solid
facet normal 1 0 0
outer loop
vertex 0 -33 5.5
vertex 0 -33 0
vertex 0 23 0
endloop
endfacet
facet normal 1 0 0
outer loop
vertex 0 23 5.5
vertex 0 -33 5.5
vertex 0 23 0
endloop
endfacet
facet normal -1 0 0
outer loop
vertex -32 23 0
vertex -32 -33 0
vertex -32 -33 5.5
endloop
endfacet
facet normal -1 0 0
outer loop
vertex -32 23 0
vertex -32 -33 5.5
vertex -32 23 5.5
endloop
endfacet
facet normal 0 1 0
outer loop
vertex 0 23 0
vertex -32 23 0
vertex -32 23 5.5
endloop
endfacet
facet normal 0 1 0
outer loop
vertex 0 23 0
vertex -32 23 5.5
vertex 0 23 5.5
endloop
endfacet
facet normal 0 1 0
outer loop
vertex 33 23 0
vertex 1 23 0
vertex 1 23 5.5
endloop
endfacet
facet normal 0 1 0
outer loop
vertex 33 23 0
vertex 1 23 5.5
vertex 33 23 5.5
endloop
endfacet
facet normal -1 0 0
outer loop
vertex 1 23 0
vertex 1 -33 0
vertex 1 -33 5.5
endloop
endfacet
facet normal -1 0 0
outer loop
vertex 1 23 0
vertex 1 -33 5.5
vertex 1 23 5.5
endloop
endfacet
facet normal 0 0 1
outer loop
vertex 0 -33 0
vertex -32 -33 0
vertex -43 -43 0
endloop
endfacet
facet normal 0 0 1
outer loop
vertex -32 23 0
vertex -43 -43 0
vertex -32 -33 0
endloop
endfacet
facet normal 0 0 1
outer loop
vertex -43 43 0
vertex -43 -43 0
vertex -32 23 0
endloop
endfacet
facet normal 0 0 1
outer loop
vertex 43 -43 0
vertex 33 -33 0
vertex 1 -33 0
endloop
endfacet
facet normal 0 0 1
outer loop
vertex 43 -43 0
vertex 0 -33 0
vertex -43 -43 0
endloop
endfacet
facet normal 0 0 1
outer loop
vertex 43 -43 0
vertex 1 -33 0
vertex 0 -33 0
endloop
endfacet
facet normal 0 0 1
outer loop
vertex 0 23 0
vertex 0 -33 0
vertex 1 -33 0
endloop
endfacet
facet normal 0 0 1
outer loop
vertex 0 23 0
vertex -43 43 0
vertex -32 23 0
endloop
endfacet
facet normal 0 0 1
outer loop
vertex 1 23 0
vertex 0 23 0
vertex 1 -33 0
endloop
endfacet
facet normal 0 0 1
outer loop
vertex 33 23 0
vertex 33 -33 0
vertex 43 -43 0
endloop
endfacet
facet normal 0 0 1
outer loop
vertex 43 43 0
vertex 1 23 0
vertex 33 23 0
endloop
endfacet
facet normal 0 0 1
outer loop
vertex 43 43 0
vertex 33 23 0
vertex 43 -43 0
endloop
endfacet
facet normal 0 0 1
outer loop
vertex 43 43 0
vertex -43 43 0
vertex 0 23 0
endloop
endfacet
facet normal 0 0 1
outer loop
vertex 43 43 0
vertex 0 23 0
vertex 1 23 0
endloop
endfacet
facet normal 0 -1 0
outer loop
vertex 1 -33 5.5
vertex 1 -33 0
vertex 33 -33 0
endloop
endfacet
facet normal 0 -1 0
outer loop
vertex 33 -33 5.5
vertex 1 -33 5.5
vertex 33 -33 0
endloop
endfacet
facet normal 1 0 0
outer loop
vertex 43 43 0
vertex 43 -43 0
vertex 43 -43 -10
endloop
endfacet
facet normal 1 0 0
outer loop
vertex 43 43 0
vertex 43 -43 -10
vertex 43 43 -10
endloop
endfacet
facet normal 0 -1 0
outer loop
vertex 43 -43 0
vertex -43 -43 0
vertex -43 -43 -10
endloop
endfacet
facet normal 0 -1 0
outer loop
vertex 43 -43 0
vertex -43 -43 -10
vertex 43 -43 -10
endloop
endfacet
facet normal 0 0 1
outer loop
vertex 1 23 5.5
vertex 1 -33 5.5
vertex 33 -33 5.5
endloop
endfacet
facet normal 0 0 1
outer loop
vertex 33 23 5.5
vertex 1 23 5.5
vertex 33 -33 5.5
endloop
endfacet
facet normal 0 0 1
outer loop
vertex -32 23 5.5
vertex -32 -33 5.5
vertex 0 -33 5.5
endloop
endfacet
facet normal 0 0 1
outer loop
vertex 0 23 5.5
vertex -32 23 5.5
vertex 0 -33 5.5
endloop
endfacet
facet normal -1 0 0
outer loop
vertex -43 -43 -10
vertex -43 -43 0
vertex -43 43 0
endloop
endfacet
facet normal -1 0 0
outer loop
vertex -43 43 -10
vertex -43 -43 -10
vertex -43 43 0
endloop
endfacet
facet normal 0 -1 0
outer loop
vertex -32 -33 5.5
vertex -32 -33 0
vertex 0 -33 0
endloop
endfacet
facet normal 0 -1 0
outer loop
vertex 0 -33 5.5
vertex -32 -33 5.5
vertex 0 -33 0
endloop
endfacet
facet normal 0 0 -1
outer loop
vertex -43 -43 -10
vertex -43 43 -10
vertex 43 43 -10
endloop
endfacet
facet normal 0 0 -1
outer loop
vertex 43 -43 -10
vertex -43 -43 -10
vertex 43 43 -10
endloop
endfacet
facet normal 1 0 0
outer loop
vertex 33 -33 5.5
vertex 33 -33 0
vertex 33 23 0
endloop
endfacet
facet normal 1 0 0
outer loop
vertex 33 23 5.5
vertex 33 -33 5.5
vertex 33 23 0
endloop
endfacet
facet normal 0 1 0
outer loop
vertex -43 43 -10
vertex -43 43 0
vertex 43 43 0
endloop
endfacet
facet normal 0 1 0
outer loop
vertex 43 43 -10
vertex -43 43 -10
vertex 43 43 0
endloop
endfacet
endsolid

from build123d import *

# Parameters (mm, degrees)
SKETCH_1_W      = 86
SKETCH_1_H      = 86
EXTRUDE_2_DEPTH = 10
SKETCH_2_W      = 32
SKETCH_2_H      = 56
EXTRUDE_3_DEPTH = 5.5


with BuildPart() as part:
    # 草图1 → 凸台-拉伸2 (new body)
    with BuildSketch(Plane.XY):
        Rectangle(SKETCH_1_W, SKETCH_1_H)
    extrude(amount=-EXTRUDE_2_DEPTH)

    # 草图2 → 凸台-拉伸3 (add)
    with BuildSketch(Plane.XY):
        with Locations((17, -5)):
            Rectangle(SKETCH_2_W, SKETCH_2_H)
        with Locations((-16, -5)):
            Rectangle(SKETCH_2_W, SKETCH_2_H)
    extrude(amount=EXTRUDE_3_DEPTH)


solid = part.part
